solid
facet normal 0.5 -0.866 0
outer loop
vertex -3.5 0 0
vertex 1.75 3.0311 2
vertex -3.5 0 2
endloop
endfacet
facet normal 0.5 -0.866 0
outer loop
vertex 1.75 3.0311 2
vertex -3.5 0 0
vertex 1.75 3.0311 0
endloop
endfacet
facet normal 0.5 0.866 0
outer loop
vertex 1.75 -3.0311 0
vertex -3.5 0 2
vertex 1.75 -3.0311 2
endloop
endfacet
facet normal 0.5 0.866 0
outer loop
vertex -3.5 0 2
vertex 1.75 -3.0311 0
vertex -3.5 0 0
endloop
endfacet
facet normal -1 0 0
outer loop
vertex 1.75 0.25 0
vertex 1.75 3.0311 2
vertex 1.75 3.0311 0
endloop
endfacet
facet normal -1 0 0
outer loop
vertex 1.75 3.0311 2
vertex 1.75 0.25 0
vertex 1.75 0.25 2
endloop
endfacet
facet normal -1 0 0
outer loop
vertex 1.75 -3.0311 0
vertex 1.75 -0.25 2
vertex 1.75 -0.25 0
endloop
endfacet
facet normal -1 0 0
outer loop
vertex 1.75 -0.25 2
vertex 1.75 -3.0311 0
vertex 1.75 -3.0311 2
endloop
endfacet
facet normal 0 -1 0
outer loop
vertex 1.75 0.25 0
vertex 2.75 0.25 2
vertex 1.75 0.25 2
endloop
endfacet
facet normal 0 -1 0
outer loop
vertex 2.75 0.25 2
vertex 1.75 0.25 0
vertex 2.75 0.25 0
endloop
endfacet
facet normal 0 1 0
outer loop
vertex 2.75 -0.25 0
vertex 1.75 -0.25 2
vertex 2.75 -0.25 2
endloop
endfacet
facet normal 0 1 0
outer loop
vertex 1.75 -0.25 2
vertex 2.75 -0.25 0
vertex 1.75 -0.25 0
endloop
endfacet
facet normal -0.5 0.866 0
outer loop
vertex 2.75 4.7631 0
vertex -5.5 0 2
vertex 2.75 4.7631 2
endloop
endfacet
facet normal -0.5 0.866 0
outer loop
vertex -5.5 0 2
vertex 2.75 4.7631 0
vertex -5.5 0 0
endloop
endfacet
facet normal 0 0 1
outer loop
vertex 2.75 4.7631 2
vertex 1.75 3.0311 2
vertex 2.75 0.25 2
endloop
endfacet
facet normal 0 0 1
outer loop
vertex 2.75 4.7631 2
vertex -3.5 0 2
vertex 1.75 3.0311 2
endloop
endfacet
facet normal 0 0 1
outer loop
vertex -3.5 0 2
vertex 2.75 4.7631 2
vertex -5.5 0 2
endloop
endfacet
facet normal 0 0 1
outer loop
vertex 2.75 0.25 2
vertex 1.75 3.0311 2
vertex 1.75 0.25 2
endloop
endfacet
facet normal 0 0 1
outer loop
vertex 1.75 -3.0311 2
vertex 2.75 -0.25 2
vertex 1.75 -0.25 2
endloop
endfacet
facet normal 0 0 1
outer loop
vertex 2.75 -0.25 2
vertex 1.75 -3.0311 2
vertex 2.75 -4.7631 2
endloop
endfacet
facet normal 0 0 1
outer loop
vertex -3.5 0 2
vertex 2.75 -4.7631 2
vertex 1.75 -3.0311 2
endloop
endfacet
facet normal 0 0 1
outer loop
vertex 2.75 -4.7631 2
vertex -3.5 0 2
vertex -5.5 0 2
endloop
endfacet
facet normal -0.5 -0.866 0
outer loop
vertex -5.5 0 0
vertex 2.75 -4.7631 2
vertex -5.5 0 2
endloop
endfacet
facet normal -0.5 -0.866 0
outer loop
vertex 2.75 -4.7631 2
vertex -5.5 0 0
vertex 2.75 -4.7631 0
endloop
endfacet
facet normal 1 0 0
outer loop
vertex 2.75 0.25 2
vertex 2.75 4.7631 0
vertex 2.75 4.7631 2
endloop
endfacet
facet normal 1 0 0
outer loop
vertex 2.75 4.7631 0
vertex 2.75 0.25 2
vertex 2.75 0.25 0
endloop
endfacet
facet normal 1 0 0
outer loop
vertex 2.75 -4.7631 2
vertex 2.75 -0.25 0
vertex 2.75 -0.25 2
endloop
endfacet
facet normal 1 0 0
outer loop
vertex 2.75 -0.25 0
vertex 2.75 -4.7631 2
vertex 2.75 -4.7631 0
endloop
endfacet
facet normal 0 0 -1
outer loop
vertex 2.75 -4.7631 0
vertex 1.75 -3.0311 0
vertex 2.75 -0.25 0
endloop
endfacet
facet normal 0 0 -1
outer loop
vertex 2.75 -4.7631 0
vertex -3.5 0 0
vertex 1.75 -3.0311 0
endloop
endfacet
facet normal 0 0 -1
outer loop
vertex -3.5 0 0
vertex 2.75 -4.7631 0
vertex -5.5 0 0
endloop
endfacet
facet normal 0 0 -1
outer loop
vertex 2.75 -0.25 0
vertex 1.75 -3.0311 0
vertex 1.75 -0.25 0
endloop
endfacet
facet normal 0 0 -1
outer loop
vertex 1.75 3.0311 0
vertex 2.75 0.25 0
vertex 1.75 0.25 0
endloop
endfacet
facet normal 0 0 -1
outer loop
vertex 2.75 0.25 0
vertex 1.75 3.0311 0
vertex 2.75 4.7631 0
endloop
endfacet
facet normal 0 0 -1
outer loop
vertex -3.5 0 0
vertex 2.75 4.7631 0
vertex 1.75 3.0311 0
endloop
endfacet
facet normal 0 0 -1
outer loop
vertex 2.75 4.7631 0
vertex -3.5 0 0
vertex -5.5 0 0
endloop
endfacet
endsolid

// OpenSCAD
// Customizable Clip

// For clipping together wires, etc.

// Gap between ends
gap=0.5;
// Thickness of clip
thickness=2;
// Inner diameter of clip
diameter=7;
// Number of sides
sides=3; //[3:32]

$fn=sides;

difference() {
	rotate([0,0,360/sides/2]) cylinder(r=diameter/2+thickness, h=thickness);
	translate([0,0,-1]) {
		rotate([0,0,360/sides/2]) cylinder(r=diameter/2, h=thickness+2);
		translate([0,-gap/2,0]) cube([diameter,gap,thickness+2]);
		}
	}
